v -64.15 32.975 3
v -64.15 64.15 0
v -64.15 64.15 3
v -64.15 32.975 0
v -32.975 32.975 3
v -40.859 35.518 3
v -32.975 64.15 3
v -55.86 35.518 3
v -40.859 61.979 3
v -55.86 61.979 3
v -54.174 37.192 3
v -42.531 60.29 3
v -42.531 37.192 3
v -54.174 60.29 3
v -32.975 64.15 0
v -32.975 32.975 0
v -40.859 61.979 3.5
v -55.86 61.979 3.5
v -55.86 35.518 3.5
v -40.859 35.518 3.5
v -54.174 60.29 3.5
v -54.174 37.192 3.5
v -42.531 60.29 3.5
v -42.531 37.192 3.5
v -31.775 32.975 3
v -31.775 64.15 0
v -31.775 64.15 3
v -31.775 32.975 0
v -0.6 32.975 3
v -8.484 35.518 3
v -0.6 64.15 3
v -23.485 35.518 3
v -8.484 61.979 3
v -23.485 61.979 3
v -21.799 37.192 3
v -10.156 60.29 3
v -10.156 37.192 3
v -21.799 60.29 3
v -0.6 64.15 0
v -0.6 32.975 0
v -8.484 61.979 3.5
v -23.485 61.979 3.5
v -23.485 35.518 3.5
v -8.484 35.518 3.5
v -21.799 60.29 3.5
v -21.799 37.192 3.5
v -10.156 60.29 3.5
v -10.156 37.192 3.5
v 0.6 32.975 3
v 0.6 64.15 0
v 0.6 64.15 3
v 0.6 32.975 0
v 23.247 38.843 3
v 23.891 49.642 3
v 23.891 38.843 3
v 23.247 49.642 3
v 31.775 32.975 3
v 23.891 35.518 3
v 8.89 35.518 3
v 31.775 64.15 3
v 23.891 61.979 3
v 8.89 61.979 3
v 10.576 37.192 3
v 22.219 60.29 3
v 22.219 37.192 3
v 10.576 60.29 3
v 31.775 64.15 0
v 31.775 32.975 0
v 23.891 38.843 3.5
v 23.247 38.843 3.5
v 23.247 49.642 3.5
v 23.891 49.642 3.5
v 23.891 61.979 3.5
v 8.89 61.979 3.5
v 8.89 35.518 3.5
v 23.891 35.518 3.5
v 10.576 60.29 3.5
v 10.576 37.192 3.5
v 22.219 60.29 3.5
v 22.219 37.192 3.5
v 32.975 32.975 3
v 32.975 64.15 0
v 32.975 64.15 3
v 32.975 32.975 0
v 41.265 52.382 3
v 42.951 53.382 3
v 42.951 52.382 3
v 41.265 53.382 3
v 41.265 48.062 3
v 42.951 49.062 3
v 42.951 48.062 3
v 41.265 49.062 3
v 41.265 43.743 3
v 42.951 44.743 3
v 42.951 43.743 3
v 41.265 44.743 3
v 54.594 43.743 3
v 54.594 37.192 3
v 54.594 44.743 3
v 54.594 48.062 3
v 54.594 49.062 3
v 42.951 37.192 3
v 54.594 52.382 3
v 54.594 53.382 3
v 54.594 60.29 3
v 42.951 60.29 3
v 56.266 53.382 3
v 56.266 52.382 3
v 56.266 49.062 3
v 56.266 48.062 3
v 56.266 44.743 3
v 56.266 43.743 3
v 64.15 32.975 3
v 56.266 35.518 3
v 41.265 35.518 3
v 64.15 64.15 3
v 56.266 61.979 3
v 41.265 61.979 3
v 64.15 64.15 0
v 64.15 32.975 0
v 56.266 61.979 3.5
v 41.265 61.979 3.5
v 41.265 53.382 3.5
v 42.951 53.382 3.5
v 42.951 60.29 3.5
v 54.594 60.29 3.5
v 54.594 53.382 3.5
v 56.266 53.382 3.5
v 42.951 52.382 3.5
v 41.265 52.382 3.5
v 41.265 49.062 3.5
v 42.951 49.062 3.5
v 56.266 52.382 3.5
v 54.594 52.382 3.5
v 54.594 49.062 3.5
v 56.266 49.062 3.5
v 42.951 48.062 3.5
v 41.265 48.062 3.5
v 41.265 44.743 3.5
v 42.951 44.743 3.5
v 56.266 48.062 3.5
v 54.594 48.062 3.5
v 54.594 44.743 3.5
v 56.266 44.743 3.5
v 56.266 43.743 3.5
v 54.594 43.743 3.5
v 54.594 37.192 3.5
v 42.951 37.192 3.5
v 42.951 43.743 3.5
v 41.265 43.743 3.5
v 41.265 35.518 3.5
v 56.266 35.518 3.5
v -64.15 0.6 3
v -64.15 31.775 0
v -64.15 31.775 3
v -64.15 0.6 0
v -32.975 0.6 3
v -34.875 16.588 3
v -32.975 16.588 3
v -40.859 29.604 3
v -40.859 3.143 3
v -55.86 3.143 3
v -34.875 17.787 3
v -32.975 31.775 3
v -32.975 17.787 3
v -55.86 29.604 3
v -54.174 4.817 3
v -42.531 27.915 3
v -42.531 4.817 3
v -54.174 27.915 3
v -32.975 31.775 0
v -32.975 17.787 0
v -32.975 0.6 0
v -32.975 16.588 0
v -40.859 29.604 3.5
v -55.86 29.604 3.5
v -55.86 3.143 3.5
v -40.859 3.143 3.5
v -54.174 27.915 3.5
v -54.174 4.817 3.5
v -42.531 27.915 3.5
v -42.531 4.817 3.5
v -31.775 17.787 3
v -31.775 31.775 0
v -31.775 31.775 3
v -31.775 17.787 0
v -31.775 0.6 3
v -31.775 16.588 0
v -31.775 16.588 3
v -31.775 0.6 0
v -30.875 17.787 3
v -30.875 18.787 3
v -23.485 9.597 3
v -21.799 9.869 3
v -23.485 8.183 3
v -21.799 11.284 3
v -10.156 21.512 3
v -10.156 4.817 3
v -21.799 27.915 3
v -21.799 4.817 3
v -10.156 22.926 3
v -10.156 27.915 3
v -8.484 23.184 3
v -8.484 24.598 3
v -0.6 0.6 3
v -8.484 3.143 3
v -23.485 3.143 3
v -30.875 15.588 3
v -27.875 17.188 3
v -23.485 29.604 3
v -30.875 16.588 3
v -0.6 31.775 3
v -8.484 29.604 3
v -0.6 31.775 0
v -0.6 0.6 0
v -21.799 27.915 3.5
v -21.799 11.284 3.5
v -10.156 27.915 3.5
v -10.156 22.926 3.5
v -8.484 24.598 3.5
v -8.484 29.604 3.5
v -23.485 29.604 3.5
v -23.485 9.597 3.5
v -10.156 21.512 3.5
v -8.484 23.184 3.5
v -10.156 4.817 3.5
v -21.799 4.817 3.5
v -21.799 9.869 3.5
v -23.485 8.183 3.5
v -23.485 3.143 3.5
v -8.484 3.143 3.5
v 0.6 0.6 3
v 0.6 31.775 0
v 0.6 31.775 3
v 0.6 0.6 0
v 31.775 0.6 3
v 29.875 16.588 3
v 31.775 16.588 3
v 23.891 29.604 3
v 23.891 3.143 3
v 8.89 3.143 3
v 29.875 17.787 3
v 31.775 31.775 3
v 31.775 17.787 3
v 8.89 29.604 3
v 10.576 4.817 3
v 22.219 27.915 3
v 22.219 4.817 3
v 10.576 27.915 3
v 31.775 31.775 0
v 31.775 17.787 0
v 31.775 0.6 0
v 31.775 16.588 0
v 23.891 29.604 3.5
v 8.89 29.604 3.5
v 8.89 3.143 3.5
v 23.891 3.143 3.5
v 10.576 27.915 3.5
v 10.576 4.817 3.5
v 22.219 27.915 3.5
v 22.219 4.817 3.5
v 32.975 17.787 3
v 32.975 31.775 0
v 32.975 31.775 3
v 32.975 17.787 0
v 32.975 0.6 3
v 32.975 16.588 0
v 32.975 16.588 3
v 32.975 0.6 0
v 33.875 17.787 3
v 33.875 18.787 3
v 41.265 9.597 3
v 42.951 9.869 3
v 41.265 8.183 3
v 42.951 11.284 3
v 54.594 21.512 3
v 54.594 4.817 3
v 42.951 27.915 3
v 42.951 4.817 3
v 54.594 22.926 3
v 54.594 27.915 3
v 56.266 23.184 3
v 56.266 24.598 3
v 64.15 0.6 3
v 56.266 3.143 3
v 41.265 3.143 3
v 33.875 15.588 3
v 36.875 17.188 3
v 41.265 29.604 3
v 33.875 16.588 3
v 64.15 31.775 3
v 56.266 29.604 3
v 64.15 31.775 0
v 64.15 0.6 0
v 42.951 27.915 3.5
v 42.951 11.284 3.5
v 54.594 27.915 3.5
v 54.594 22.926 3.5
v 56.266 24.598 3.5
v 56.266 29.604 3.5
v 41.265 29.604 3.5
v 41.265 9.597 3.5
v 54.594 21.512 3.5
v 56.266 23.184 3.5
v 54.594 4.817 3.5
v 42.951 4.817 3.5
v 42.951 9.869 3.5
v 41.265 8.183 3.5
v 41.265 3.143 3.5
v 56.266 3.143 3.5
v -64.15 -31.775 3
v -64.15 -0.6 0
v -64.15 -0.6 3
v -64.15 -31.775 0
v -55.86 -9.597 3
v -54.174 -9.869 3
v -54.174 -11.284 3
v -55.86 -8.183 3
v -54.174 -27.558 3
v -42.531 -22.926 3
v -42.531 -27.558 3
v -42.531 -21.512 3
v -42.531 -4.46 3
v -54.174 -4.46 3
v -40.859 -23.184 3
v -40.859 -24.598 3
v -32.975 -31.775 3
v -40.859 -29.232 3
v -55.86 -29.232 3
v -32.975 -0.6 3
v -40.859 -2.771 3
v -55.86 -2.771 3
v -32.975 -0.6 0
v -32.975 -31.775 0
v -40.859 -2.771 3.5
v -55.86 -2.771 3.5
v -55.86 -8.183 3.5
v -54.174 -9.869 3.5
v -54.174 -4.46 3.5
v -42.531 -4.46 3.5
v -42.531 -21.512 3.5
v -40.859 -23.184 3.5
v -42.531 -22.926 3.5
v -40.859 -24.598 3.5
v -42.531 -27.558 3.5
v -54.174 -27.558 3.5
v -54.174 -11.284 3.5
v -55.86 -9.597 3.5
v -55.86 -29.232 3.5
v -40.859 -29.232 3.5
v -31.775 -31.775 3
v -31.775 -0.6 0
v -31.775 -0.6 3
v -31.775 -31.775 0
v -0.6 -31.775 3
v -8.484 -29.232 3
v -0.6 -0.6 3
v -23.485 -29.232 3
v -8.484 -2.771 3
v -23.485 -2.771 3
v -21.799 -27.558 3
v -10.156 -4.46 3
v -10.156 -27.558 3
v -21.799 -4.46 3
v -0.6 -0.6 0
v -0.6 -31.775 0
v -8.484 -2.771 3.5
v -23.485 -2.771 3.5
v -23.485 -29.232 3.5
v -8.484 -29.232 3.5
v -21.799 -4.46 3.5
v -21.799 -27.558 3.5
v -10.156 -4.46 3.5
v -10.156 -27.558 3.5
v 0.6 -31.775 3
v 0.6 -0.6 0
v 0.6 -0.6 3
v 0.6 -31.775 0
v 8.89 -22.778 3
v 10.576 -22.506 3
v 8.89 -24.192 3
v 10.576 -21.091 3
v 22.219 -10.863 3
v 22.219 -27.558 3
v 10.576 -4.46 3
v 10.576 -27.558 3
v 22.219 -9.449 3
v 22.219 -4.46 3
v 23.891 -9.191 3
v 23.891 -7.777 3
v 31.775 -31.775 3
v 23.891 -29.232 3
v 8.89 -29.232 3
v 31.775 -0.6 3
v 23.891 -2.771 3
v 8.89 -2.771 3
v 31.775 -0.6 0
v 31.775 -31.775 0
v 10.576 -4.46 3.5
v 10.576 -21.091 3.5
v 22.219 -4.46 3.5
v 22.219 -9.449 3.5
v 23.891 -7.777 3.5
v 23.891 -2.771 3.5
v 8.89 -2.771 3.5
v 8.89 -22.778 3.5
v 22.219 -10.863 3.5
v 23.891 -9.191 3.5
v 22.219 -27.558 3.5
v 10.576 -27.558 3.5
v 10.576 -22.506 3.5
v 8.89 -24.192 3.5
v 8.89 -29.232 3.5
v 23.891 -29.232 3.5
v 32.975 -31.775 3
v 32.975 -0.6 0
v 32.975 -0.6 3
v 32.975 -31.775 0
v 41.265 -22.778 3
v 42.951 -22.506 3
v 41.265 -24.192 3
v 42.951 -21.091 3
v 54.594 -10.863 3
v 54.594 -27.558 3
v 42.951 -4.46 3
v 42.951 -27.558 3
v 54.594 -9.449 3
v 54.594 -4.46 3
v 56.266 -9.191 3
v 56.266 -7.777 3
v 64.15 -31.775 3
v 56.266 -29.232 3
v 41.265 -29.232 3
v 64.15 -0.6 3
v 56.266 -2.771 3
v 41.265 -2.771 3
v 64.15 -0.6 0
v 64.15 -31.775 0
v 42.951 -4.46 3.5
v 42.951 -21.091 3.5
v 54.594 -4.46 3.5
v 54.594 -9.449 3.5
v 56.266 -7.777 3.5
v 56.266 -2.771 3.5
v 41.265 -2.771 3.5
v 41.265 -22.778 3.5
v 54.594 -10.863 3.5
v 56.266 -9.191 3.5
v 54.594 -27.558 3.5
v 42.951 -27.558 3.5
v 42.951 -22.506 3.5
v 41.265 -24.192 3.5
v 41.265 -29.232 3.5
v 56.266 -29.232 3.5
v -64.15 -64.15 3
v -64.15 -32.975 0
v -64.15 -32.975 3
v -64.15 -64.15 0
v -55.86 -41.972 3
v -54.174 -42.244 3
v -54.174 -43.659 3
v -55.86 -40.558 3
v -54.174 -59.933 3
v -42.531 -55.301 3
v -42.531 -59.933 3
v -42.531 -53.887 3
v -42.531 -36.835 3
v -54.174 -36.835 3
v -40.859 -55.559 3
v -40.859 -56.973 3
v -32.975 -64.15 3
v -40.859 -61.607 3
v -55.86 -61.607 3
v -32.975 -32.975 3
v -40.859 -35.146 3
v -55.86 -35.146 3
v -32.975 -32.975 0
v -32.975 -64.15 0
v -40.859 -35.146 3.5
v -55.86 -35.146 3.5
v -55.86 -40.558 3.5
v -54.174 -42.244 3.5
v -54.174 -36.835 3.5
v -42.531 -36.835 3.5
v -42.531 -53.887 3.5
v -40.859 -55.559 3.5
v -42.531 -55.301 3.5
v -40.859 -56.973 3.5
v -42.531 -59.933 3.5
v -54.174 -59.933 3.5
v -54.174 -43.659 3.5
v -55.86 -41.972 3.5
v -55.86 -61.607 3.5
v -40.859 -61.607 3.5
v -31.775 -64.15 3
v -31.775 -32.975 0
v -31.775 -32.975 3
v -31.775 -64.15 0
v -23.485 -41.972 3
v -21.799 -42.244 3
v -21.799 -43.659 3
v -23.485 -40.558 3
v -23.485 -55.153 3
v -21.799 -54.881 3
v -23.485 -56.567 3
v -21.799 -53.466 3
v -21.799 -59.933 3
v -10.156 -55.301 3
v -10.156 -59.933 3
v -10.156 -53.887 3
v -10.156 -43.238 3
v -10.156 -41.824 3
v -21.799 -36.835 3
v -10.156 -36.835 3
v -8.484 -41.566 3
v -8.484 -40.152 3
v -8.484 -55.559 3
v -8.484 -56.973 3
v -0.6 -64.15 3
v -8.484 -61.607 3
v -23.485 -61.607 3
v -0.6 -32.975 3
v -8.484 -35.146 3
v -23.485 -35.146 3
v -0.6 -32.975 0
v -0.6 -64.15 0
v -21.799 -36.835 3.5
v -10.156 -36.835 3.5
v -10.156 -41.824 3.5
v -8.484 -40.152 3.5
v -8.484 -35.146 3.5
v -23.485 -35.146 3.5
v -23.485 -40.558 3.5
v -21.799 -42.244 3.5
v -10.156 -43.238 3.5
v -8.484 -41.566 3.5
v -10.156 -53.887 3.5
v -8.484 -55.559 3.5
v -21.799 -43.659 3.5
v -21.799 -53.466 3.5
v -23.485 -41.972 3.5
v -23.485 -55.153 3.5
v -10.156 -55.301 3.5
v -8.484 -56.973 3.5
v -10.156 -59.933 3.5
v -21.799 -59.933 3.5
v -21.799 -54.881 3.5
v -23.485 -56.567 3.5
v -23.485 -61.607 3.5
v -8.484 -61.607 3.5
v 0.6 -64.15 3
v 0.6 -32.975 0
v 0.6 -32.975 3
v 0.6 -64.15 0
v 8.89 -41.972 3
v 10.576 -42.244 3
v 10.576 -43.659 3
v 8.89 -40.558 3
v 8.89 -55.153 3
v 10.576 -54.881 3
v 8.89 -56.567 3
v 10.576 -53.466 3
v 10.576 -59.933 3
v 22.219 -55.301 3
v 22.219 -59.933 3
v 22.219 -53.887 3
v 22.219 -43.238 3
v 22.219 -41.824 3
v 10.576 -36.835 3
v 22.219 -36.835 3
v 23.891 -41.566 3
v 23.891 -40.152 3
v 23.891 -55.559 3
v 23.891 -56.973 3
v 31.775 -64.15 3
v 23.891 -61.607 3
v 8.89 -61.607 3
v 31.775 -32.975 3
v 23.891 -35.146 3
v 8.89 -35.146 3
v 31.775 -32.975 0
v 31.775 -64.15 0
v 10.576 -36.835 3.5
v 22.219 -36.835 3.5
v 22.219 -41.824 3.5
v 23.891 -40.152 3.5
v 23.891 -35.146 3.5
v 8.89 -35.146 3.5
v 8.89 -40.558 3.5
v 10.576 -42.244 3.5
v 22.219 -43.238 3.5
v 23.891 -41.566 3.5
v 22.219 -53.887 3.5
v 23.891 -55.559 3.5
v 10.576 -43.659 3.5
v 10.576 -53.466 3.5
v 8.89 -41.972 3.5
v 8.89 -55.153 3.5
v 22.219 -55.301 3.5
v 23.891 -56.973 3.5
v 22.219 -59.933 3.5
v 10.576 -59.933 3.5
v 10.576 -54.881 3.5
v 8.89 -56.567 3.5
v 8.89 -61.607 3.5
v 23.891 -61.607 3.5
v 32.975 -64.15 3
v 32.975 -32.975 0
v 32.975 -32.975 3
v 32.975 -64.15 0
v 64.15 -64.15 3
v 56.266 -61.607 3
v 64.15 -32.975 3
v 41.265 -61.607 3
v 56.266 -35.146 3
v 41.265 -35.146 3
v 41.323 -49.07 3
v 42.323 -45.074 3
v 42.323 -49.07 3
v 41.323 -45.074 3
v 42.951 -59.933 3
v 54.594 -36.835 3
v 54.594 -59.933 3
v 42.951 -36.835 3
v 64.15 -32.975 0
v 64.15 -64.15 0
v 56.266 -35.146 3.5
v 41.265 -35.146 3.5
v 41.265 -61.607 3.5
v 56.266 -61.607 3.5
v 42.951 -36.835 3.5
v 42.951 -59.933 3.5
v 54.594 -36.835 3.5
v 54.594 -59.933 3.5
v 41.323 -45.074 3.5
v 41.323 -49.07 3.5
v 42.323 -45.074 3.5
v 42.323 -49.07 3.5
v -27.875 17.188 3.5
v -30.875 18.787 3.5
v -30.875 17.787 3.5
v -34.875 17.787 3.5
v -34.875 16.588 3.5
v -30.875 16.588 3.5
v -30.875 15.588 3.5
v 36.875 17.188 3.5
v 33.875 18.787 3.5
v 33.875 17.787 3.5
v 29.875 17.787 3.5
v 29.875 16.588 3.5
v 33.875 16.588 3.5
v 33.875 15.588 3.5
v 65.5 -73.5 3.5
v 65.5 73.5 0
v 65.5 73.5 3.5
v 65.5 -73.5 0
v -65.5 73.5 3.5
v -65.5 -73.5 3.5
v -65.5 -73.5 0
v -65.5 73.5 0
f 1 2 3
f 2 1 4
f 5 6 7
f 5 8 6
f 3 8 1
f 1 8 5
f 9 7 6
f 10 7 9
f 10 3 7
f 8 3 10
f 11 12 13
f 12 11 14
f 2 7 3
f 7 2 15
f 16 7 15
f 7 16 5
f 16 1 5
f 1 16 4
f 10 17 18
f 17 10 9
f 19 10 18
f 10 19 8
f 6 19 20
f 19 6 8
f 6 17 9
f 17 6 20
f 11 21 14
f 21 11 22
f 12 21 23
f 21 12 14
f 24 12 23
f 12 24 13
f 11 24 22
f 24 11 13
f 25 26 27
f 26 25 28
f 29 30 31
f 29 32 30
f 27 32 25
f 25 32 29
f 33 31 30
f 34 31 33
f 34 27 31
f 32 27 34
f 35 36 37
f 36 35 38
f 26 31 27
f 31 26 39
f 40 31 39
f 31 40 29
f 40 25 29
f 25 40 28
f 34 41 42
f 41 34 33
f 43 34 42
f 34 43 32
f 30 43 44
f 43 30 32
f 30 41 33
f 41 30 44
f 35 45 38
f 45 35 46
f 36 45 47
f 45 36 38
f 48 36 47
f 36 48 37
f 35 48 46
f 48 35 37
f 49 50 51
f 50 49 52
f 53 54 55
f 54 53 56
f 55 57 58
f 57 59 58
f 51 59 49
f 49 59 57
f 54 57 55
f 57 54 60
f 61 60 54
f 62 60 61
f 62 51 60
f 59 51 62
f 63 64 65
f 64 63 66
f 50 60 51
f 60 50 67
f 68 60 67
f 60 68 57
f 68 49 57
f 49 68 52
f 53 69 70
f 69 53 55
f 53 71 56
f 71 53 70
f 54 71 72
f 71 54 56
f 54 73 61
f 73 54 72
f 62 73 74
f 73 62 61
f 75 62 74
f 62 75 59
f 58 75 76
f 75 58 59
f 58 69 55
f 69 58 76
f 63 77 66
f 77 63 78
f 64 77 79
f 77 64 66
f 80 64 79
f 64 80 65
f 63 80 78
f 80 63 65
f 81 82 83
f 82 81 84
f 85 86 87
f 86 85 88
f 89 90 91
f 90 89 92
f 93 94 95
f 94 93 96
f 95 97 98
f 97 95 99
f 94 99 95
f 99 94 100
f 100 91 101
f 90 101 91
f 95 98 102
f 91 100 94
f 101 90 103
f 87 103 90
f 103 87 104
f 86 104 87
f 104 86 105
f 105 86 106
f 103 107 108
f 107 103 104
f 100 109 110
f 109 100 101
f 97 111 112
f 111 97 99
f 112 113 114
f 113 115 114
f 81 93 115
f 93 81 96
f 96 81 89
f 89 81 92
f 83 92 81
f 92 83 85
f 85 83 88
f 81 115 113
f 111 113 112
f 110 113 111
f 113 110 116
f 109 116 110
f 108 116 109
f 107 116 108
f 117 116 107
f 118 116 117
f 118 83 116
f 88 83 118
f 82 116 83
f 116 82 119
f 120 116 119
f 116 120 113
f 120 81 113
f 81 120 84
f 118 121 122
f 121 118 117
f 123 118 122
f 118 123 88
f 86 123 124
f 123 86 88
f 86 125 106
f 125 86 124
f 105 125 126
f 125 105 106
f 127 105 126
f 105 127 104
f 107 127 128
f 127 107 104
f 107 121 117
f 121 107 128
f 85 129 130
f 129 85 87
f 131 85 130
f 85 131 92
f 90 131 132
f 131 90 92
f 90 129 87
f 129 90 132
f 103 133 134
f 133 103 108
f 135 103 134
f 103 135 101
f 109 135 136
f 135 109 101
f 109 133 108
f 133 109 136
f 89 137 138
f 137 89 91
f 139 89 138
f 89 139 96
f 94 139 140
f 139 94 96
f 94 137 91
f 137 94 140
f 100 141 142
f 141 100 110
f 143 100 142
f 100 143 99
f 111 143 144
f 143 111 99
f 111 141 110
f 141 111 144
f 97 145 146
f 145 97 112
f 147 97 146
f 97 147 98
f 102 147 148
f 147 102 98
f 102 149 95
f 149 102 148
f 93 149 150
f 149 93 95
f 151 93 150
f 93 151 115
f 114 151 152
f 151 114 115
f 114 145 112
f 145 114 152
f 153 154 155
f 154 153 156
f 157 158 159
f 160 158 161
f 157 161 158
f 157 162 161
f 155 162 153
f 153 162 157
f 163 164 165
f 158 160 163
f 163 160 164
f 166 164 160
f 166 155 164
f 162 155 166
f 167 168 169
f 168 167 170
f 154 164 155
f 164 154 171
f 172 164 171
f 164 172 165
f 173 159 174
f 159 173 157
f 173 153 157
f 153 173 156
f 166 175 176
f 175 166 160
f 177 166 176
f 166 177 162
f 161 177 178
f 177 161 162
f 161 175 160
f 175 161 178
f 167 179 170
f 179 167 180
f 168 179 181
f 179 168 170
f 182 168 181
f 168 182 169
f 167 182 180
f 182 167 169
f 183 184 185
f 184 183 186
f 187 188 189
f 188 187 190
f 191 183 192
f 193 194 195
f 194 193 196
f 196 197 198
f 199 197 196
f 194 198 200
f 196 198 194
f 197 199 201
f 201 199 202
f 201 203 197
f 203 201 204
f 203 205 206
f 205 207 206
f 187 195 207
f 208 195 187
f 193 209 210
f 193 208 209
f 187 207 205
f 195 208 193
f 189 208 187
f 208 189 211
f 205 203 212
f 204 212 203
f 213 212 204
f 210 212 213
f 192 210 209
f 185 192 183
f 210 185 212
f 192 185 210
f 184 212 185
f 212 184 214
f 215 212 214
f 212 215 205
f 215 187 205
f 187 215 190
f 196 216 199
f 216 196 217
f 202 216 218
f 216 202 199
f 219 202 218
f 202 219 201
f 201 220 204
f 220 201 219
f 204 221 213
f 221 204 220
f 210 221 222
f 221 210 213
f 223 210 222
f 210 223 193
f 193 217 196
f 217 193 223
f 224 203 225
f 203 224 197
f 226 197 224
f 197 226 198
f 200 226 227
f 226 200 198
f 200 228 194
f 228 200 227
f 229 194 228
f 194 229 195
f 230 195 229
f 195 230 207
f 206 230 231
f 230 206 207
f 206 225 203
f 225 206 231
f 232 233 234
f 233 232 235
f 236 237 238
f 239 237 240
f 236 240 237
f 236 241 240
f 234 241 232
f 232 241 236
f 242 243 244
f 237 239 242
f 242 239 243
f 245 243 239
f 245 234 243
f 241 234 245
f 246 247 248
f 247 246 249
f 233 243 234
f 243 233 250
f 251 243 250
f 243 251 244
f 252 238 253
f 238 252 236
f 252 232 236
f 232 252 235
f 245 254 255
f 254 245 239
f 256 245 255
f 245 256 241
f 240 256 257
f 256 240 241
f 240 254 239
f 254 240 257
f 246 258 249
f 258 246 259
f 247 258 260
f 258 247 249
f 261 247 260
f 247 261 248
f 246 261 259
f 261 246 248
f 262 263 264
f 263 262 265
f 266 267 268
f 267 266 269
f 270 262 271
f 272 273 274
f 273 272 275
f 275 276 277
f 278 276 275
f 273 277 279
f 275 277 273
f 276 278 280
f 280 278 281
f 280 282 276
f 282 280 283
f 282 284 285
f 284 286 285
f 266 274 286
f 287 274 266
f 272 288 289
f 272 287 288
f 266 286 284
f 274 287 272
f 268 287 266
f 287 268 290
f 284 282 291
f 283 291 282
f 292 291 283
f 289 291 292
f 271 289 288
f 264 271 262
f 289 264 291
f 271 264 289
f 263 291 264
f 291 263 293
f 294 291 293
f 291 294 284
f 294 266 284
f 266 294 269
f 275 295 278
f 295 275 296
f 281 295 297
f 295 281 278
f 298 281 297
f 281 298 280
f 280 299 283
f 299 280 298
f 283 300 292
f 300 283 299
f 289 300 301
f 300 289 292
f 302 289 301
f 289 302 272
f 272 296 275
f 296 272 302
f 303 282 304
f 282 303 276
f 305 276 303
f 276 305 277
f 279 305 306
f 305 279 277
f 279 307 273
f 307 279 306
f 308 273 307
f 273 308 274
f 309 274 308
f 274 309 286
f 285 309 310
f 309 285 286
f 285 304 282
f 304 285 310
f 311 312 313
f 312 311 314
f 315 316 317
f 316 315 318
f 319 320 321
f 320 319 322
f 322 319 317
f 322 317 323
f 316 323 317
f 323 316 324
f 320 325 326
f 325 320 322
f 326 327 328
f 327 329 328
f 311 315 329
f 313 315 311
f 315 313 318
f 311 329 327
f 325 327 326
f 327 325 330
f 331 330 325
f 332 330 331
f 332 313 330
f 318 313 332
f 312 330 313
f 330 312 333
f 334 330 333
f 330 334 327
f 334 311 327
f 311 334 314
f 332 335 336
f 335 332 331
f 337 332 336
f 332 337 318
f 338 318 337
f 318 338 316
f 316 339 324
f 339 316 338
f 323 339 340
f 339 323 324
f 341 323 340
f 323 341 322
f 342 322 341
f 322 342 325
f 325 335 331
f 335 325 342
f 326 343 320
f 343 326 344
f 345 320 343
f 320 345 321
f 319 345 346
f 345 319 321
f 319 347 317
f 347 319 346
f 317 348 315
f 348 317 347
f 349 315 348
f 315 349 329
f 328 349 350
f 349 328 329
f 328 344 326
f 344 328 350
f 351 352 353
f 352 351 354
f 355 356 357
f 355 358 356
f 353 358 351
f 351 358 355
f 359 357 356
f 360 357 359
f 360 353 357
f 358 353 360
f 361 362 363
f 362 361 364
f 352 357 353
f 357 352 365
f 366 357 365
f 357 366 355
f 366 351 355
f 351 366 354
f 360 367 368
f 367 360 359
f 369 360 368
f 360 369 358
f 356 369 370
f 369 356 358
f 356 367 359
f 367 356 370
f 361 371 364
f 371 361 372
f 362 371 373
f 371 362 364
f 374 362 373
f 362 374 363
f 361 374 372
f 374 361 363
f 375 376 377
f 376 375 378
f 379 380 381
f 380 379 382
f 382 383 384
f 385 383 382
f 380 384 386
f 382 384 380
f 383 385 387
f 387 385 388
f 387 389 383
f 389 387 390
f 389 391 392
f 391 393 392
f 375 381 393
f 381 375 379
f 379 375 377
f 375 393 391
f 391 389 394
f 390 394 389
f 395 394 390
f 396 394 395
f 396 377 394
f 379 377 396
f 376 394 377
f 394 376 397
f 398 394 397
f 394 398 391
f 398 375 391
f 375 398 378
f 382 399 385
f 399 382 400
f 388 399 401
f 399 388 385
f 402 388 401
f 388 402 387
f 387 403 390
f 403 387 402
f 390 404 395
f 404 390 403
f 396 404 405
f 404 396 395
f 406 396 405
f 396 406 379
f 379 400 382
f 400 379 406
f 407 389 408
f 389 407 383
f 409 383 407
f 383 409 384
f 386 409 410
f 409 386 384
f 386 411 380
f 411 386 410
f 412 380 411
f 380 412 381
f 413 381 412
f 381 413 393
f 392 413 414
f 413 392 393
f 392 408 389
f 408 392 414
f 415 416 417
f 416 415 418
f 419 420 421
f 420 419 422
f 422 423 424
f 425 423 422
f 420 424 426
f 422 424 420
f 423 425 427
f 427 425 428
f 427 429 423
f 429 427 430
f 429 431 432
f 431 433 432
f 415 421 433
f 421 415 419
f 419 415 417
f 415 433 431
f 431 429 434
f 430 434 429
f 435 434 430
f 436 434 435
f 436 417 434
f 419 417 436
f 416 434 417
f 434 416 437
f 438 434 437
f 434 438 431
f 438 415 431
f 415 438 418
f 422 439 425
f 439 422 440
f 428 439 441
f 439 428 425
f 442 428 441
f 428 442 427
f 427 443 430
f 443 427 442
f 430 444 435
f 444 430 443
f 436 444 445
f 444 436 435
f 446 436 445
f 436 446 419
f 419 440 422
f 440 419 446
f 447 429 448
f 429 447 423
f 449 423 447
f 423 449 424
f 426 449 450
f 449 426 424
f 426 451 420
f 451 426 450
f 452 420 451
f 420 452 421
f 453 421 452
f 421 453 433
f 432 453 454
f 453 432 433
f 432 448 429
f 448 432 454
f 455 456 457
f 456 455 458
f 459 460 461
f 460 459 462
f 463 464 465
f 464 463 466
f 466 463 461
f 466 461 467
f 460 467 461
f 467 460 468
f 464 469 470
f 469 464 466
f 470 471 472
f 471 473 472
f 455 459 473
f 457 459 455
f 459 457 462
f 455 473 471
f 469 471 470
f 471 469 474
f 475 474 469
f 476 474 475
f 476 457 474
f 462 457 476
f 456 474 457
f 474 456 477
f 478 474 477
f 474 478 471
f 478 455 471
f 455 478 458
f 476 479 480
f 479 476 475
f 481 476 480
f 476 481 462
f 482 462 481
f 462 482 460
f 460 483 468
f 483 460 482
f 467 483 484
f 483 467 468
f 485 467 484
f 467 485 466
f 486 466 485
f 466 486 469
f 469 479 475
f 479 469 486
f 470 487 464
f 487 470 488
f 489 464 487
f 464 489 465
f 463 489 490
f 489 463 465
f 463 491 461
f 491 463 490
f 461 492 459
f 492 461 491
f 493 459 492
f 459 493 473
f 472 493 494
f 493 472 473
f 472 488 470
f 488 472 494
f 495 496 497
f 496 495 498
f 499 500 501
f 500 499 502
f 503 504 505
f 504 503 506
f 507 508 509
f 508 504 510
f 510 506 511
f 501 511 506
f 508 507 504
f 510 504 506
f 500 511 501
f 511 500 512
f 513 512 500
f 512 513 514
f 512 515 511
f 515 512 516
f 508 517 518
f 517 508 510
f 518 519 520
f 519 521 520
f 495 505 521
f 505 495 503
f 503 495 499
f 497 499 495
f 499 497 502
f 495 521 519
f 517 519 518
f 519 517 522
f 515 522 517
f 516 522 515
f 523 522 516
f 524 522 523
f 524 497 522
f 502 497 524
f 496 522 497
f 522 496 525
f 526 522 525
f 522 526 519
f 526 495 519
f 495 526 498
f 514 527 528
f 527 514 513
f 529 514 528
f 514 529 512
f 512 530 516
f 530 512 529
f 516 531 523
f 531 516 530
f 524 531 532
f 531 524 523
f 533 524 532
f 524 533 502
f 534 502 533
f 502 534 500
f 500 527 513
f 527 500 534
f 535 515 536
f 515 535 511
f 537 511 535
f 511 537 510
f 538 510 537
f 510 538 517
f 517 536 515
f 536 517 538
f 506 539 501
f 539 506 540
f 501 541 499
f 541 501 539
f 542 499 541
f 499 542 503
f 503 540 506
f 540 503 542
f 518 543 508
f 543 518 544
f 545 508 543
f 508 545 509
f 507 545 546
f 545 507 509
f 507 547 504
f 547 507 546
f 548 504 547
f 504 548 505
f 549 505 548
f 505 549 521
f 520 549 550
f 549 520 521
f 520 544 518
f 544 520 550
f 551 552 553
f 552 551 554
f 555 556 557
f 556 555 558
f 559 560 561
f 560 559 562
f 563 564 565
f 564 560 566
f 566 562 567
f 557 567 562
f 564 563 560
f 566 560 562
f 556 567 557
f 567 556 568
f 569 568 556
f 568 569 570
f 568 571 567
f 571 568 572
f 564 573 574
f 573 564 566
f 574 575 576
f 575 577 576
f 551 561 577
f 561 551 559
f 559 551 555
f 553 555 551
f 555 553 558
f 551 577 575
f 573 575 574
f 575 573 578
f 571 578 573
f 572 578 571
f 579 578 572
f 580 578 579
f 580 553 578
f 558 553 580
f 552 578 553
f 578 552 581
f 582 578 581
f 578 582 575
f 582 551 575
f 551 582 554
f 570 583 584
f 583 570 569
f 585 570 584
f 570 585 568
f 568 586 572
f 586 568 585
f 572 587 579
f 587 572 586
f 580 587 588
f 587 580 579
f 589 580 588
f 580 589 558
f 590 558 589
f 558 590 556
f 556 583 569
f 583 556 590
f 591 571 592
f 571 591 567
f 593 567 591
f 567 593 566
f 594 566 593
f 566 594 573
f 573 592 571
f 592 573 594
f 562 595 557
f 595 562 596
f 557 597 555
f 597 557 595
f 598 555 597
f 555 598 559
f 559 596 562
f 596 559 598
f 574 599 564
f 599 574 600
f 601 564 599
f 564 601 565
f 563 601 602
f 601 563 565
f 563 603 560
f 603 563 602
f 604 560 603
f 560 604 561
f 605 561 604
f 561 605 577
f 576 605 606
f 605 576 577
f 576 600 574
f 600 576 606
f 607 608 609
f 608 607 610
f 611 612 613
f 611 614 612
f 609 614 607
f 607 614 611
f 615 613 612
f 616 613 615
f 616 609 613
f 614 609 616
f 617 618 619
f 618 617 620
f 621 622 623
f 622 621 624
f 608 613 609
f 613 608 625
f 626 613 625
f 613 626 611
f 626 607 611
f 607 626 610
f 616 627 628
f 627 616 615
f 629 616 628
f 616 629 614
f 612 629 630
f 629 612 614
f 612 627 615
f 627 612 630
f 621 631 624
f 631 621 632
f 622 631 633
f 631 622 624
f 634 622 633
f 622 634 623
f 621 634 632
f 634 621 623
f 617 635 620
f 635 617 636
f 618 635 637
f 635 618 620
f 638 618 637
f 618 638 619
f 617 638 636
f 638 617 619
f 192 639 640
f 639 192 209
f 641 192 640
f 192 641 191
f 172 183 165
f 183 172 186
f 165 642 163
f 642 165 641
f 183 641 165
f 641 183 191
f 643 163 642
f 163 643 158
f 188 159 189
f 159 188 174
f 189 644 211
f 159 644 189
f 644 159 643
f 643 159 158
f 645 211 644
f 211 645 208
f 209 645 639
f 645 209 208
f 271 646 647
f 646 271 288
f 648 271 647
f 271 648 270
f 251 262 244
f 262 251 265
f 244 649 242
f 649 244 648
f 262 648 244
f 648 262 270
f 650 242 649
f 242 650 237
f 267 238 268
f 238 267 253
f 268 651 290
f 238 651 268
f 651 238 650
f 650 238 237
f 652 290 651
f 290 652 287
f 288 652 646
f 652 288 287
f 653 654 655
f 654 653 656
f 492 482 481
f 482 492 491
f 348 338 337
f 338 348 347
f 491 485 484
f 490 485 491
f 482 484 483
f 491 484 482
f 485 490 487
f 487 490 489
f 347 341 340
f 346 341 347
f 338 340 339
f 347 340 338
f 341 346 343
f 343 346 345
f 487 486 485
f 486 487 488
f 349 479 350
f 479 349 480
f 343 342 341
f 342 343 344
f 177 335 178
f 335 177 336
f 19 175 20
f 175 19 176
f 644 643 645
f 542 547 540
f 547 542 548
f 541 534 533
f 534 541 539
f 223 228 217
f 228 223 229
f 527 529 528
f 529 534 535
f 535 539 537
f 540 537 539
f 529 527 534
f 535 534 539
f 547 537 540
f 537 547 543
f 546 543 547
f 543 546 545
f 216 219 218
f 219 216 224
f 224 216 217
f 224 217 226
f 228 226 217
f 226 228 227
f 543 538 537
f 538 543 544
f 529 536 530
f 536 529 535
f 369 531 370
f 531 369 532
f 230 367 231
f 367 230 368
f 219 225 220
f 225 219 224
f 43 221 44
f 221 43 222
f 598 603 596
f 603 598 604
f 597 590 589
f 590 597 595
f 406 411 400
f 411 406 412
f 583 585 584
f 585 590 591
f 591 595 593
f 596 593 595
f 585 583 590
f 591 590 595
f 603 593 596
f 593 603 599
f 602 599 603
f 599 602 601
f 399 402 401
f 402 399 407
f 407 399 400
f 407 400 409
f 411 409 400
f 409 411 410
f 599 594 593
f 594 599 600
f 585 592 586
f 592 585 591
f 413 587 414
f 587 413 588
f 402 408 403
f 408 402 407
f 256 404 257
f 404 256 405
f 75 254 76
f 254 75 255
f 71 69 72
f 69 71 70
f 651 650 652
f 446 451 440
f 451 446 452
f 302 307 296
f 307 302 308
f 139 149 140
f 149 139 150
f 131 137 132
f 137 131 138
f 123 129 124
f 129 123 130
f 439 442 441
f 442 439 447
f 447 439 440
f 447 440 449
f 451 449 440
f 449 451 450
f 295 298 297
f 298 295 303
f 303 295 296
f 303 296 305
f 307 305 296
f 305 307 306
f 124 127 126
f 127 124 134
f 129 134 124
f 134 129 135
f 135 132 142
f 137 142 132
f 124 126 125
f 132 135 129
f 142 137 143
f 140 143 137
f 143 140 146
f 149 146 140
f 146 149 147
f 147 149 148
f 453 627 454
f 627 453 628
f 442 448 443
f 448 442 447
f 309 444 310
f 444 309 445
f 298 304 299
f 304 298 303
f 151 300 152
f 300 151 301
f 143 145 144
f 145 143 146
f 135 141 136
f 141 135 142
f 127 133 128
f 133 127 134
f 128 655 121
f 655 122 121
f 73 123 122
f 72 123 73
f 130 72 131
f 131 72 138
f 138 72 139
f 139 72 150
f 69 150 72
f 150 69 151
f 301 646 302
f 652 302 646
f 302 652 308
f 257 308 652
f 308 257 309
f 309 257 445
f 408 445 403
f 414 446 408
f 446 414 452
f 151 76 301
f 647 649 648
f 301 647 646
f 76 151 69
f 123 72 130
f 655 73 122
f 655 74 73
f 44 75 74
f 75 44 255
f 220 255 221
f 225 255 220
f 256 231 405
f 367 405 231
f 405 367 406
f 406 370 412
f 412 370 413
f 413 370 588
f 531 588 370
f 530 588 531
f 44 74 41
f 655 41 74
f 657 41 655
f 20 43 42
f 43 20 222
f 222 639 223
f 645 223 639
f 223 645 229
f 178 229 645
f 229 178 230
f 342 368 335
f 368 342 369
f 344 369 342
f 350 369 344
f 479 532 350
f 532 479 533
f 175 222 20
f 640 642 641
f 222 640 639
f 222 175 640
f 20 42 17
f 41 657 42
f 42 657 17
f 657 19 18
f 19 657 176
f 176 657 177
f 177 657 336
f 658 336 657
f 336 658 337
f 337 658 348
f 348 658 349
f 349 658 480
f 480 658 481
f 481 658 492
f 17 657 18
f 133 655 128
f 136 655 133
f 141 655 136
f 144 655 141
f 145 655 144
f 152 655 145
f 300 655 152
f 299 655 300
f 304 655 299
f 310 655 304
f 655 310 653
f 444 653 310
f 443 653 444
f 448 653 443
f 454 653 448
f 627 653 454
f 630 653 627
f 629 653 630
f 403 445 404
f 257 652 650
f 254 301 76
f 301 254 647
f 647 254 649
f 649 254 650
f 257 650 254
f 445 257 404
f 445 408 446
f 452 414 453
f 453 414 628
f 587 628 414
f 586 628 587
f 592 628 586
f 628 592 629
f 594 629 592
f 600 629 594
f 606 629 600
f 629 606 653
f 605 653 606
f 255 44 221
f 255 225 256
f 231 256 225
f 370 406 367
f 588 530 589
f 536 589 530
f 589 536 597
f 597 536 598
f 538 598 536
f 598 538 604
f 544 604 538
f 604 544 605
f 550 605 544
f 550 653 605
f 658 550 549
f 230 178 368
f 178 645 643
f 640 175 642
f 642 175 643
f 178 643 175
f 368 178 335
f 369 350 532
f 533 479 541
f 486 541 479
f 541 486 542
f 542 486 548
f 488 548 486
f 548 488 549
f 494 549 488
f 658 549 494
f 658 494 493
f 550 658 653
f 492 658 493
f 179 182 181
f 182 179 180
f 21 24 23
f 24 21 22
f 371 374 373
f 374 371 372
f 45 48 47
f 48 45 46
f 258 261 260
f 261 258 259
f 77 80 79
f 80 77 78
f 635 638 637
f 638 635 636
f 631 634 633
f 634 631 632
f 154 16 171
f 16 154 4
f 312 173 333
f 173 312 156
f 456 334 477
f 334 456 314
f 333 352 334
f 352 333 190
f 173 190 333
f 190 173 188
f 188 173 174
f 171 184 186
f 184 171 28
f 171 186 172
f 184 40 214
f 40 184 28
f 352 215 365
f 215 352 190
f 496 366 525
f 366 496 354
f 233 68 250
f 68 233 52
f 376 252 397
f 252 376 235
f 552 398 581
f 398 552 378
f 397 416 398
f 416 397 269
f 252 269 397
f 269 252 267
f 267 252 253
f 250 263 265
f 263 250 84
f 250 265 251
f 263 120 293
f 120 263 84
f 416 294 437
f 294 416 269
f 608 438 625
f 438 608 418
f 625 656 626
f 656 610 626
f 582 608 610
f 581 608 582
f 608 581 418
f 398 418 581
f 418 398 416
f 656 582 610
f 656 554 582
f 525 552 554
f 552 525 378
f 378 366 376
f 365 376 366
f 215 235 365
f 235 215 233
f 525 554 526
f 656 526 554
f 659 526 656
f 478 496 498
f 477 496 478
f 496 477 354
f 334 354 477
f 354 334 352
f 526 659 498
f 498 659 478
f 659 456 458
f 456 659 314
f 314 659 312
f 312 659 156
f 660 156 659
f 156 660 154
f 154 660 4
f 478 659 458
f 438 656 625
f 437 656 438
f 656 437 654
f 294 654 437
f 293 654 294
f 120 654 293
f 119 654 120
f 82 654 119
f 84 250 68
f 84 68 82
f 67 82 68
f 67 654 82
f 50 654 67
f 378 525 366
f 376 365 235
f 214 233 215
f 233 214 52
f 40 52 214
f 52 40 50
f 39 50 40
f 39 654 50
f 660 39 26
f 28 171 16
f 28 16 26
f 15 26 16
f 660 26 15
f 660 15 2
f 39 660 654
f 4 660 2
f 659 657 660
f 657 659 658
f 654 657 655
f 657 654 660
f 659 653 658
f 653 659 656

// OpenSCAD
// SMC-PAD 用 漢字パッドオーバーレイ(1枚板、全16パッド)
// v6 (2026-11-11): 引っ越しに伴いスイッチ配置を変更。厚み3.5mm/ソケット3mm(v5_t3.5と同じ)。
//   2段目は 和ダーク→和風強 / 洋ダーク→洋風強 なので、和→風・洋→風 の間に「→」を貫通で追加。
// 実測: 全幅131mm、上下147mm。パッド間・外周の隙間を5.6mm→1.5mmに縮小し、
// 浮いた分をパッドサイズに回して27mm→約30.9mm角に拡大。
// 隣のパッドを誤って押さないための仕切りは、表面に壁を足すのではなく
// 裏面ソケットを深くすることで作る(パッド間に残る土台そのものが
// 深いソケットの分だけ相対的に高い壁になる)。
// 土台厚み2mm→3.5mm、ソケット深さ1.5mm→3mm(天井0.5mmは維持)。
// 空欄(◯)も同じ深さ3mmまで彫り込み、斜めハッチングでパッドに当たらないようにする。

$fn = 48;

gap      = 1.5;   // パッド間・外周の隙間(旧5.6mmから縮小)
n        = 4;     // 1辺のパッド数

plate_w  = 131;
plate_h  = 147;
tile_t   = 3.5;   // 土台厚み(v5_t3.5と同じ。深さ3mm+天井0.5mm)

// 幅131mmを「パッドn個+隙間(n+1)個(外周含め全て1.5mm)」で埋まるように
// パッドサイズを逆算する。縦方向も同じパッドサイズ・同じ隙間を使い、
// 余った分は上下の外周余白(実機のベゼル分)に割り当てる。
pad_size = (plate_w - (n+1)*gap) / n; // ≒30.875mm
grid_w   = n*pad_size + (n-1)*gap;    // パッド4個+内側の隙間3個ぶん
grid_h   = grid_w;                    // 縦横とも同じパッドサイズ・隙間

margin_lr = gap;                // 左右の外周余白 = 隙間と同じ1.5mm
margin_tb = (plate_h - grid_h) / 2; // 上下の外周余白(余り。実機のベゼル分)

socket_depth = 3;   // 裏面ソケット深さ(天井 = tile_t-socket_depth = 0.5mm)
socket_clear = 0.3;
socket_size  = pad_size + socket_clear;
blank_size   = pad_size + 0.3; // 空欄パッドのハッチング範囲

font_name = "Noto Sans CJK JP:style=Bold";
bridge_w  = 1.0;

// 文字サイズはパッドの物理サイズ拡大(27mm→約30.9mm)と連動させない。
// 元の27mm基準のまま(パッドが大きくなっても文字は同じ大きさを維持)。
text_base_size = 27;

// 文字ごとの文字サイズ倍率(標準=text_base_size*0.8 に対する倍率)。
// "3D","B2"はラテン文字+数字で標準サイズだと横に広がりすぎるため、
// 他の漢字1文字と横幅が揃うよう縮小。
size_table = [
  ["3D", 0.796],
  ["B2", 0.865],
];
function size_for(ch) =
  let(idx = search([ch], size_table)[0])
  is_list(idx) ? text_base_size*0.8 : text_base_size*0.8*size_table[idx][1];

// 文字ごとの中抜け防止ブリッジ。[角度, y比, x比(省略時0), 長さ比(省略時1.9)]
// 空リスト = ブリッジ不要な字。全て実際に検証し、1体化する最小構成のみ設定。
bridge_table = [
  ["錠", [[-45,0]]],
  ["音", [[90,0]]],
  ["門", [[45,0],[-45,0]]],
  ["天", []],
  // 温: 「日」は横線2本、「皿」は縦線3本で中抜け防止(斜め十字より見た目が良い)
  ["温", [[0,0.39,0,0.5],[0,0.19,0,0.5],[90,-0.2,-0.05,0.5],[90,-0.2,0.15,0.5],[90,-0.2,0.35,0.5]]],
  ["風", [[45,0]]],
  ["常", [[45,0]]],
  ["植", [[0,0.2],[0,-0.2],[0,0]]],
  ["机", []],
  ["3D", [[0,0,0.15,0.4]]],
  ["床", []],
  ["B2", [[45,0],[-45,0]]],
  // v6で追加。bridge.py(ラスタで囲み部分を検出し最短の縦/横ブリッジを自動配置)で算出
  ["和", [[90,-0.38,0.229,0.194]]],
  ["洋", []],
  // 廊・厨・隠は細かいので、短いブリッジでなく斜め1本(diag.pyで1体化を確認)
  ["廊", [[-45,0]]],
  ["洗", [[90,0.373,0.063,0.199]]],
  ["厨", [[45,0]]],
  ["隠", [[45,0]]],
  ["事", [[45,0],[-45,0]]],  // Office電球。斜め1本では1体化せずバッテン
  ["全", [[90,0.069,-0.312,0.185]]],
];
function bridges_for(ch) =
  let(idx = search([ch], bridge_table)[0])
  is_list(idx) ? [] : bridge_table[idx][1];

function col_x(c) = -grid_w/2 + pad_size/2 + c*(pad_size + gap);
function row_y(r) = grid_h/2 - pad_size/2 - r*(pad_size + gap);

// 実機レイアウト: 上段から13-16, 9-12, 5-8, 1-4(各行左から右)
// PAD: [[13,14,15,16],[9,10,11,12],[5,6,7,8],[1,2,3,4]]
grid_labels = [
  ["机", "床", "温", "植"],
  ["和", "風", "洋", "風"],
  ["廊", "洗", "厨", "隠"],
  ["錠", "門", "事", "全"],
];

// 和→風、洋→風 の矢印(2段目、1-2列目と3-4列目の境目に貫通穴)。
// y=+1mm付近で文字の隙間が約9mm、中心は境目より約1mm右なので、そこに長さ7mmの矢印。
arrow_on    = true;
arrow_len   = 7;
arrow_shaft = 1.2;
arrow_head_l = 3;
arrow_head_h = 3.2;
arrow_dy    = 1.0;  // 行中心からのY補正
arrow_dx    = 1.0;  // 境目からのX補正(左右の文字の隙間の中央)
module arrow_2d() {
  translate([-arrow_len/2, 0])
    union() {
      translate([0, -arrow_shaft/2]) square([arrow_len - arrow_head_l + 0.01, arrow_shaft]);
      polygon([[arrow_len - arrow_head_l, -arrow_head_h/2],
               [arrow_len, 0],
               [arrow_len - arrow_head_l,  arrow_head_h/2]]);
    }
}

module kanji_hole(ch) {
  ts = size_for(ch);
  linear_extrude(height = tile_t + 4, center = true)
    difference() {
      // offset(delta=0.001): 「洗」などフォント輪郭が自己交差する字で
      // "mesh is not closed" になり穴ごと消えるのを防ぐ(見た目への影響なし)
      offset(delta = 0.001)
        text(ch, size = ts, font = font_name, halign = "center", valign = "center");
      for (b = bridges_for(ch)) {
        ang = b[0];
        xoff = (len(b) > 2) ? b[2] : 0;
        len_frac = (len(b) > 3) ? b[3] : 1.9;
        if (ang == 0)
          // 水平バー: 座標そのまま(回転無し)
          translate([xoff*ts, b[1]*ts, 0])
            square([len_frac*ts, bridge_w], center = true);
        else if (ang == 90)
          // 垂直バー: 座標そのまま(回転無し)
          translate([xoff*ts, b[1]*ts, 0])
            square([bridge_w, len_frac*ts], center = true);
        else
          // 斜め(45/-45等): 原点中心に回転(既存の指定と互換)
          rotate([0,0,ang])
            translate([0, b[1]*ts, 0])
              square([len_frac*ts, bridge_w], center = true);
      }
    }
}

// 空欄パッド用の斜めハッチング。ソケット部分(天井0.5mm)だけを貫通させ、
// 土台全体(3.5mm)は貫通させない(実機パッドがソケットに収まるようにする)。
hatch_w     = 2;   // ハッチ線の太さ
hatch_pitch = 4;   // ハッチ線の間隔
ceiling_t   = tile_t - socket_depth; // 天井の厚み(0.5mm)

module blank_hatch() {
  intersection() {
    // 天井部分(z=[socket_depth, tile_t])だけに限定。上下に0.5mmずつ
    // 余裕を持たせて面一致による欠けを防止。
    translate([-blank_size/2, -blank_size/2, socket_depth - 0.5])
      cube([blank_size, blank_size, ceiling_t + 1], center = false);
    // 斜め45度の帯を並べる
    union()
      for (i = [-6:6])
        translate([i*hatch_pitch, 0, 0])
          rotate([0,0,45])
            linear_extrude(height = tile_t + 4, center = true)
              square([hatch_w, blank_size*2], center = true);
  }
}

module pad_cut(cx, cy, ch) {
  translate([cx, cy, 0]) {
    // 裏面ソケット(パッドの出っ張りを受ける)。空欄パッドも同じ深さで彫り、
    // 実機の未使用パッドがちゃんと収まるようにする。
    translate([0,0,-1])
      linear_extrude(height = socket_depth + 1)
        square([socket_size, socket_size], center = true);
    if (ch == "◯") {
      // 空欄パッド: 天井(0.5mm)だけを斜めハッチングで貫通させる
      blank_hatch();
    } else {
      // 漢字(貫通穴、ブリッジで中抜け防止)
      kanji_hole(ch);
    }
  }
}

// 試し刷り用: 0〜3を指定するとその縦1列だけを出力(左右は隙間gap分の縁)。
// -1で全16パッドの1枚板。コマンドラインから -D sample_col=N で上書き可。
sample_col = -1;

cols = (sample_col < 0) ? [0:n-1] : [sample_col:sample_col];
body_w  = (sample_col < 0) ? plate_w : pad_size + 2*gap;
body_cx = (sample_col < 0) ? 0 : col_x(sample_col);

difference() {
  translate([body_cx, 0, tile_t/2])
    cube([body_w, plate_h, tile_t], center = true);
  for (r = [0:3])
    for (c = cols)
      pad_cut(col_x(c), row_y(r), grid_labels[r][c]);
  if (arrow_on && sample_col < 0)
    for (c = [0, 2])
      translate([(col_x(c)+col_x(c+1))/2 + arrow_dx, row_y(1) + arrow_dy, 0])
        linear_extrude(height = tile_t + 4, center = true) arrow_2d();
}
